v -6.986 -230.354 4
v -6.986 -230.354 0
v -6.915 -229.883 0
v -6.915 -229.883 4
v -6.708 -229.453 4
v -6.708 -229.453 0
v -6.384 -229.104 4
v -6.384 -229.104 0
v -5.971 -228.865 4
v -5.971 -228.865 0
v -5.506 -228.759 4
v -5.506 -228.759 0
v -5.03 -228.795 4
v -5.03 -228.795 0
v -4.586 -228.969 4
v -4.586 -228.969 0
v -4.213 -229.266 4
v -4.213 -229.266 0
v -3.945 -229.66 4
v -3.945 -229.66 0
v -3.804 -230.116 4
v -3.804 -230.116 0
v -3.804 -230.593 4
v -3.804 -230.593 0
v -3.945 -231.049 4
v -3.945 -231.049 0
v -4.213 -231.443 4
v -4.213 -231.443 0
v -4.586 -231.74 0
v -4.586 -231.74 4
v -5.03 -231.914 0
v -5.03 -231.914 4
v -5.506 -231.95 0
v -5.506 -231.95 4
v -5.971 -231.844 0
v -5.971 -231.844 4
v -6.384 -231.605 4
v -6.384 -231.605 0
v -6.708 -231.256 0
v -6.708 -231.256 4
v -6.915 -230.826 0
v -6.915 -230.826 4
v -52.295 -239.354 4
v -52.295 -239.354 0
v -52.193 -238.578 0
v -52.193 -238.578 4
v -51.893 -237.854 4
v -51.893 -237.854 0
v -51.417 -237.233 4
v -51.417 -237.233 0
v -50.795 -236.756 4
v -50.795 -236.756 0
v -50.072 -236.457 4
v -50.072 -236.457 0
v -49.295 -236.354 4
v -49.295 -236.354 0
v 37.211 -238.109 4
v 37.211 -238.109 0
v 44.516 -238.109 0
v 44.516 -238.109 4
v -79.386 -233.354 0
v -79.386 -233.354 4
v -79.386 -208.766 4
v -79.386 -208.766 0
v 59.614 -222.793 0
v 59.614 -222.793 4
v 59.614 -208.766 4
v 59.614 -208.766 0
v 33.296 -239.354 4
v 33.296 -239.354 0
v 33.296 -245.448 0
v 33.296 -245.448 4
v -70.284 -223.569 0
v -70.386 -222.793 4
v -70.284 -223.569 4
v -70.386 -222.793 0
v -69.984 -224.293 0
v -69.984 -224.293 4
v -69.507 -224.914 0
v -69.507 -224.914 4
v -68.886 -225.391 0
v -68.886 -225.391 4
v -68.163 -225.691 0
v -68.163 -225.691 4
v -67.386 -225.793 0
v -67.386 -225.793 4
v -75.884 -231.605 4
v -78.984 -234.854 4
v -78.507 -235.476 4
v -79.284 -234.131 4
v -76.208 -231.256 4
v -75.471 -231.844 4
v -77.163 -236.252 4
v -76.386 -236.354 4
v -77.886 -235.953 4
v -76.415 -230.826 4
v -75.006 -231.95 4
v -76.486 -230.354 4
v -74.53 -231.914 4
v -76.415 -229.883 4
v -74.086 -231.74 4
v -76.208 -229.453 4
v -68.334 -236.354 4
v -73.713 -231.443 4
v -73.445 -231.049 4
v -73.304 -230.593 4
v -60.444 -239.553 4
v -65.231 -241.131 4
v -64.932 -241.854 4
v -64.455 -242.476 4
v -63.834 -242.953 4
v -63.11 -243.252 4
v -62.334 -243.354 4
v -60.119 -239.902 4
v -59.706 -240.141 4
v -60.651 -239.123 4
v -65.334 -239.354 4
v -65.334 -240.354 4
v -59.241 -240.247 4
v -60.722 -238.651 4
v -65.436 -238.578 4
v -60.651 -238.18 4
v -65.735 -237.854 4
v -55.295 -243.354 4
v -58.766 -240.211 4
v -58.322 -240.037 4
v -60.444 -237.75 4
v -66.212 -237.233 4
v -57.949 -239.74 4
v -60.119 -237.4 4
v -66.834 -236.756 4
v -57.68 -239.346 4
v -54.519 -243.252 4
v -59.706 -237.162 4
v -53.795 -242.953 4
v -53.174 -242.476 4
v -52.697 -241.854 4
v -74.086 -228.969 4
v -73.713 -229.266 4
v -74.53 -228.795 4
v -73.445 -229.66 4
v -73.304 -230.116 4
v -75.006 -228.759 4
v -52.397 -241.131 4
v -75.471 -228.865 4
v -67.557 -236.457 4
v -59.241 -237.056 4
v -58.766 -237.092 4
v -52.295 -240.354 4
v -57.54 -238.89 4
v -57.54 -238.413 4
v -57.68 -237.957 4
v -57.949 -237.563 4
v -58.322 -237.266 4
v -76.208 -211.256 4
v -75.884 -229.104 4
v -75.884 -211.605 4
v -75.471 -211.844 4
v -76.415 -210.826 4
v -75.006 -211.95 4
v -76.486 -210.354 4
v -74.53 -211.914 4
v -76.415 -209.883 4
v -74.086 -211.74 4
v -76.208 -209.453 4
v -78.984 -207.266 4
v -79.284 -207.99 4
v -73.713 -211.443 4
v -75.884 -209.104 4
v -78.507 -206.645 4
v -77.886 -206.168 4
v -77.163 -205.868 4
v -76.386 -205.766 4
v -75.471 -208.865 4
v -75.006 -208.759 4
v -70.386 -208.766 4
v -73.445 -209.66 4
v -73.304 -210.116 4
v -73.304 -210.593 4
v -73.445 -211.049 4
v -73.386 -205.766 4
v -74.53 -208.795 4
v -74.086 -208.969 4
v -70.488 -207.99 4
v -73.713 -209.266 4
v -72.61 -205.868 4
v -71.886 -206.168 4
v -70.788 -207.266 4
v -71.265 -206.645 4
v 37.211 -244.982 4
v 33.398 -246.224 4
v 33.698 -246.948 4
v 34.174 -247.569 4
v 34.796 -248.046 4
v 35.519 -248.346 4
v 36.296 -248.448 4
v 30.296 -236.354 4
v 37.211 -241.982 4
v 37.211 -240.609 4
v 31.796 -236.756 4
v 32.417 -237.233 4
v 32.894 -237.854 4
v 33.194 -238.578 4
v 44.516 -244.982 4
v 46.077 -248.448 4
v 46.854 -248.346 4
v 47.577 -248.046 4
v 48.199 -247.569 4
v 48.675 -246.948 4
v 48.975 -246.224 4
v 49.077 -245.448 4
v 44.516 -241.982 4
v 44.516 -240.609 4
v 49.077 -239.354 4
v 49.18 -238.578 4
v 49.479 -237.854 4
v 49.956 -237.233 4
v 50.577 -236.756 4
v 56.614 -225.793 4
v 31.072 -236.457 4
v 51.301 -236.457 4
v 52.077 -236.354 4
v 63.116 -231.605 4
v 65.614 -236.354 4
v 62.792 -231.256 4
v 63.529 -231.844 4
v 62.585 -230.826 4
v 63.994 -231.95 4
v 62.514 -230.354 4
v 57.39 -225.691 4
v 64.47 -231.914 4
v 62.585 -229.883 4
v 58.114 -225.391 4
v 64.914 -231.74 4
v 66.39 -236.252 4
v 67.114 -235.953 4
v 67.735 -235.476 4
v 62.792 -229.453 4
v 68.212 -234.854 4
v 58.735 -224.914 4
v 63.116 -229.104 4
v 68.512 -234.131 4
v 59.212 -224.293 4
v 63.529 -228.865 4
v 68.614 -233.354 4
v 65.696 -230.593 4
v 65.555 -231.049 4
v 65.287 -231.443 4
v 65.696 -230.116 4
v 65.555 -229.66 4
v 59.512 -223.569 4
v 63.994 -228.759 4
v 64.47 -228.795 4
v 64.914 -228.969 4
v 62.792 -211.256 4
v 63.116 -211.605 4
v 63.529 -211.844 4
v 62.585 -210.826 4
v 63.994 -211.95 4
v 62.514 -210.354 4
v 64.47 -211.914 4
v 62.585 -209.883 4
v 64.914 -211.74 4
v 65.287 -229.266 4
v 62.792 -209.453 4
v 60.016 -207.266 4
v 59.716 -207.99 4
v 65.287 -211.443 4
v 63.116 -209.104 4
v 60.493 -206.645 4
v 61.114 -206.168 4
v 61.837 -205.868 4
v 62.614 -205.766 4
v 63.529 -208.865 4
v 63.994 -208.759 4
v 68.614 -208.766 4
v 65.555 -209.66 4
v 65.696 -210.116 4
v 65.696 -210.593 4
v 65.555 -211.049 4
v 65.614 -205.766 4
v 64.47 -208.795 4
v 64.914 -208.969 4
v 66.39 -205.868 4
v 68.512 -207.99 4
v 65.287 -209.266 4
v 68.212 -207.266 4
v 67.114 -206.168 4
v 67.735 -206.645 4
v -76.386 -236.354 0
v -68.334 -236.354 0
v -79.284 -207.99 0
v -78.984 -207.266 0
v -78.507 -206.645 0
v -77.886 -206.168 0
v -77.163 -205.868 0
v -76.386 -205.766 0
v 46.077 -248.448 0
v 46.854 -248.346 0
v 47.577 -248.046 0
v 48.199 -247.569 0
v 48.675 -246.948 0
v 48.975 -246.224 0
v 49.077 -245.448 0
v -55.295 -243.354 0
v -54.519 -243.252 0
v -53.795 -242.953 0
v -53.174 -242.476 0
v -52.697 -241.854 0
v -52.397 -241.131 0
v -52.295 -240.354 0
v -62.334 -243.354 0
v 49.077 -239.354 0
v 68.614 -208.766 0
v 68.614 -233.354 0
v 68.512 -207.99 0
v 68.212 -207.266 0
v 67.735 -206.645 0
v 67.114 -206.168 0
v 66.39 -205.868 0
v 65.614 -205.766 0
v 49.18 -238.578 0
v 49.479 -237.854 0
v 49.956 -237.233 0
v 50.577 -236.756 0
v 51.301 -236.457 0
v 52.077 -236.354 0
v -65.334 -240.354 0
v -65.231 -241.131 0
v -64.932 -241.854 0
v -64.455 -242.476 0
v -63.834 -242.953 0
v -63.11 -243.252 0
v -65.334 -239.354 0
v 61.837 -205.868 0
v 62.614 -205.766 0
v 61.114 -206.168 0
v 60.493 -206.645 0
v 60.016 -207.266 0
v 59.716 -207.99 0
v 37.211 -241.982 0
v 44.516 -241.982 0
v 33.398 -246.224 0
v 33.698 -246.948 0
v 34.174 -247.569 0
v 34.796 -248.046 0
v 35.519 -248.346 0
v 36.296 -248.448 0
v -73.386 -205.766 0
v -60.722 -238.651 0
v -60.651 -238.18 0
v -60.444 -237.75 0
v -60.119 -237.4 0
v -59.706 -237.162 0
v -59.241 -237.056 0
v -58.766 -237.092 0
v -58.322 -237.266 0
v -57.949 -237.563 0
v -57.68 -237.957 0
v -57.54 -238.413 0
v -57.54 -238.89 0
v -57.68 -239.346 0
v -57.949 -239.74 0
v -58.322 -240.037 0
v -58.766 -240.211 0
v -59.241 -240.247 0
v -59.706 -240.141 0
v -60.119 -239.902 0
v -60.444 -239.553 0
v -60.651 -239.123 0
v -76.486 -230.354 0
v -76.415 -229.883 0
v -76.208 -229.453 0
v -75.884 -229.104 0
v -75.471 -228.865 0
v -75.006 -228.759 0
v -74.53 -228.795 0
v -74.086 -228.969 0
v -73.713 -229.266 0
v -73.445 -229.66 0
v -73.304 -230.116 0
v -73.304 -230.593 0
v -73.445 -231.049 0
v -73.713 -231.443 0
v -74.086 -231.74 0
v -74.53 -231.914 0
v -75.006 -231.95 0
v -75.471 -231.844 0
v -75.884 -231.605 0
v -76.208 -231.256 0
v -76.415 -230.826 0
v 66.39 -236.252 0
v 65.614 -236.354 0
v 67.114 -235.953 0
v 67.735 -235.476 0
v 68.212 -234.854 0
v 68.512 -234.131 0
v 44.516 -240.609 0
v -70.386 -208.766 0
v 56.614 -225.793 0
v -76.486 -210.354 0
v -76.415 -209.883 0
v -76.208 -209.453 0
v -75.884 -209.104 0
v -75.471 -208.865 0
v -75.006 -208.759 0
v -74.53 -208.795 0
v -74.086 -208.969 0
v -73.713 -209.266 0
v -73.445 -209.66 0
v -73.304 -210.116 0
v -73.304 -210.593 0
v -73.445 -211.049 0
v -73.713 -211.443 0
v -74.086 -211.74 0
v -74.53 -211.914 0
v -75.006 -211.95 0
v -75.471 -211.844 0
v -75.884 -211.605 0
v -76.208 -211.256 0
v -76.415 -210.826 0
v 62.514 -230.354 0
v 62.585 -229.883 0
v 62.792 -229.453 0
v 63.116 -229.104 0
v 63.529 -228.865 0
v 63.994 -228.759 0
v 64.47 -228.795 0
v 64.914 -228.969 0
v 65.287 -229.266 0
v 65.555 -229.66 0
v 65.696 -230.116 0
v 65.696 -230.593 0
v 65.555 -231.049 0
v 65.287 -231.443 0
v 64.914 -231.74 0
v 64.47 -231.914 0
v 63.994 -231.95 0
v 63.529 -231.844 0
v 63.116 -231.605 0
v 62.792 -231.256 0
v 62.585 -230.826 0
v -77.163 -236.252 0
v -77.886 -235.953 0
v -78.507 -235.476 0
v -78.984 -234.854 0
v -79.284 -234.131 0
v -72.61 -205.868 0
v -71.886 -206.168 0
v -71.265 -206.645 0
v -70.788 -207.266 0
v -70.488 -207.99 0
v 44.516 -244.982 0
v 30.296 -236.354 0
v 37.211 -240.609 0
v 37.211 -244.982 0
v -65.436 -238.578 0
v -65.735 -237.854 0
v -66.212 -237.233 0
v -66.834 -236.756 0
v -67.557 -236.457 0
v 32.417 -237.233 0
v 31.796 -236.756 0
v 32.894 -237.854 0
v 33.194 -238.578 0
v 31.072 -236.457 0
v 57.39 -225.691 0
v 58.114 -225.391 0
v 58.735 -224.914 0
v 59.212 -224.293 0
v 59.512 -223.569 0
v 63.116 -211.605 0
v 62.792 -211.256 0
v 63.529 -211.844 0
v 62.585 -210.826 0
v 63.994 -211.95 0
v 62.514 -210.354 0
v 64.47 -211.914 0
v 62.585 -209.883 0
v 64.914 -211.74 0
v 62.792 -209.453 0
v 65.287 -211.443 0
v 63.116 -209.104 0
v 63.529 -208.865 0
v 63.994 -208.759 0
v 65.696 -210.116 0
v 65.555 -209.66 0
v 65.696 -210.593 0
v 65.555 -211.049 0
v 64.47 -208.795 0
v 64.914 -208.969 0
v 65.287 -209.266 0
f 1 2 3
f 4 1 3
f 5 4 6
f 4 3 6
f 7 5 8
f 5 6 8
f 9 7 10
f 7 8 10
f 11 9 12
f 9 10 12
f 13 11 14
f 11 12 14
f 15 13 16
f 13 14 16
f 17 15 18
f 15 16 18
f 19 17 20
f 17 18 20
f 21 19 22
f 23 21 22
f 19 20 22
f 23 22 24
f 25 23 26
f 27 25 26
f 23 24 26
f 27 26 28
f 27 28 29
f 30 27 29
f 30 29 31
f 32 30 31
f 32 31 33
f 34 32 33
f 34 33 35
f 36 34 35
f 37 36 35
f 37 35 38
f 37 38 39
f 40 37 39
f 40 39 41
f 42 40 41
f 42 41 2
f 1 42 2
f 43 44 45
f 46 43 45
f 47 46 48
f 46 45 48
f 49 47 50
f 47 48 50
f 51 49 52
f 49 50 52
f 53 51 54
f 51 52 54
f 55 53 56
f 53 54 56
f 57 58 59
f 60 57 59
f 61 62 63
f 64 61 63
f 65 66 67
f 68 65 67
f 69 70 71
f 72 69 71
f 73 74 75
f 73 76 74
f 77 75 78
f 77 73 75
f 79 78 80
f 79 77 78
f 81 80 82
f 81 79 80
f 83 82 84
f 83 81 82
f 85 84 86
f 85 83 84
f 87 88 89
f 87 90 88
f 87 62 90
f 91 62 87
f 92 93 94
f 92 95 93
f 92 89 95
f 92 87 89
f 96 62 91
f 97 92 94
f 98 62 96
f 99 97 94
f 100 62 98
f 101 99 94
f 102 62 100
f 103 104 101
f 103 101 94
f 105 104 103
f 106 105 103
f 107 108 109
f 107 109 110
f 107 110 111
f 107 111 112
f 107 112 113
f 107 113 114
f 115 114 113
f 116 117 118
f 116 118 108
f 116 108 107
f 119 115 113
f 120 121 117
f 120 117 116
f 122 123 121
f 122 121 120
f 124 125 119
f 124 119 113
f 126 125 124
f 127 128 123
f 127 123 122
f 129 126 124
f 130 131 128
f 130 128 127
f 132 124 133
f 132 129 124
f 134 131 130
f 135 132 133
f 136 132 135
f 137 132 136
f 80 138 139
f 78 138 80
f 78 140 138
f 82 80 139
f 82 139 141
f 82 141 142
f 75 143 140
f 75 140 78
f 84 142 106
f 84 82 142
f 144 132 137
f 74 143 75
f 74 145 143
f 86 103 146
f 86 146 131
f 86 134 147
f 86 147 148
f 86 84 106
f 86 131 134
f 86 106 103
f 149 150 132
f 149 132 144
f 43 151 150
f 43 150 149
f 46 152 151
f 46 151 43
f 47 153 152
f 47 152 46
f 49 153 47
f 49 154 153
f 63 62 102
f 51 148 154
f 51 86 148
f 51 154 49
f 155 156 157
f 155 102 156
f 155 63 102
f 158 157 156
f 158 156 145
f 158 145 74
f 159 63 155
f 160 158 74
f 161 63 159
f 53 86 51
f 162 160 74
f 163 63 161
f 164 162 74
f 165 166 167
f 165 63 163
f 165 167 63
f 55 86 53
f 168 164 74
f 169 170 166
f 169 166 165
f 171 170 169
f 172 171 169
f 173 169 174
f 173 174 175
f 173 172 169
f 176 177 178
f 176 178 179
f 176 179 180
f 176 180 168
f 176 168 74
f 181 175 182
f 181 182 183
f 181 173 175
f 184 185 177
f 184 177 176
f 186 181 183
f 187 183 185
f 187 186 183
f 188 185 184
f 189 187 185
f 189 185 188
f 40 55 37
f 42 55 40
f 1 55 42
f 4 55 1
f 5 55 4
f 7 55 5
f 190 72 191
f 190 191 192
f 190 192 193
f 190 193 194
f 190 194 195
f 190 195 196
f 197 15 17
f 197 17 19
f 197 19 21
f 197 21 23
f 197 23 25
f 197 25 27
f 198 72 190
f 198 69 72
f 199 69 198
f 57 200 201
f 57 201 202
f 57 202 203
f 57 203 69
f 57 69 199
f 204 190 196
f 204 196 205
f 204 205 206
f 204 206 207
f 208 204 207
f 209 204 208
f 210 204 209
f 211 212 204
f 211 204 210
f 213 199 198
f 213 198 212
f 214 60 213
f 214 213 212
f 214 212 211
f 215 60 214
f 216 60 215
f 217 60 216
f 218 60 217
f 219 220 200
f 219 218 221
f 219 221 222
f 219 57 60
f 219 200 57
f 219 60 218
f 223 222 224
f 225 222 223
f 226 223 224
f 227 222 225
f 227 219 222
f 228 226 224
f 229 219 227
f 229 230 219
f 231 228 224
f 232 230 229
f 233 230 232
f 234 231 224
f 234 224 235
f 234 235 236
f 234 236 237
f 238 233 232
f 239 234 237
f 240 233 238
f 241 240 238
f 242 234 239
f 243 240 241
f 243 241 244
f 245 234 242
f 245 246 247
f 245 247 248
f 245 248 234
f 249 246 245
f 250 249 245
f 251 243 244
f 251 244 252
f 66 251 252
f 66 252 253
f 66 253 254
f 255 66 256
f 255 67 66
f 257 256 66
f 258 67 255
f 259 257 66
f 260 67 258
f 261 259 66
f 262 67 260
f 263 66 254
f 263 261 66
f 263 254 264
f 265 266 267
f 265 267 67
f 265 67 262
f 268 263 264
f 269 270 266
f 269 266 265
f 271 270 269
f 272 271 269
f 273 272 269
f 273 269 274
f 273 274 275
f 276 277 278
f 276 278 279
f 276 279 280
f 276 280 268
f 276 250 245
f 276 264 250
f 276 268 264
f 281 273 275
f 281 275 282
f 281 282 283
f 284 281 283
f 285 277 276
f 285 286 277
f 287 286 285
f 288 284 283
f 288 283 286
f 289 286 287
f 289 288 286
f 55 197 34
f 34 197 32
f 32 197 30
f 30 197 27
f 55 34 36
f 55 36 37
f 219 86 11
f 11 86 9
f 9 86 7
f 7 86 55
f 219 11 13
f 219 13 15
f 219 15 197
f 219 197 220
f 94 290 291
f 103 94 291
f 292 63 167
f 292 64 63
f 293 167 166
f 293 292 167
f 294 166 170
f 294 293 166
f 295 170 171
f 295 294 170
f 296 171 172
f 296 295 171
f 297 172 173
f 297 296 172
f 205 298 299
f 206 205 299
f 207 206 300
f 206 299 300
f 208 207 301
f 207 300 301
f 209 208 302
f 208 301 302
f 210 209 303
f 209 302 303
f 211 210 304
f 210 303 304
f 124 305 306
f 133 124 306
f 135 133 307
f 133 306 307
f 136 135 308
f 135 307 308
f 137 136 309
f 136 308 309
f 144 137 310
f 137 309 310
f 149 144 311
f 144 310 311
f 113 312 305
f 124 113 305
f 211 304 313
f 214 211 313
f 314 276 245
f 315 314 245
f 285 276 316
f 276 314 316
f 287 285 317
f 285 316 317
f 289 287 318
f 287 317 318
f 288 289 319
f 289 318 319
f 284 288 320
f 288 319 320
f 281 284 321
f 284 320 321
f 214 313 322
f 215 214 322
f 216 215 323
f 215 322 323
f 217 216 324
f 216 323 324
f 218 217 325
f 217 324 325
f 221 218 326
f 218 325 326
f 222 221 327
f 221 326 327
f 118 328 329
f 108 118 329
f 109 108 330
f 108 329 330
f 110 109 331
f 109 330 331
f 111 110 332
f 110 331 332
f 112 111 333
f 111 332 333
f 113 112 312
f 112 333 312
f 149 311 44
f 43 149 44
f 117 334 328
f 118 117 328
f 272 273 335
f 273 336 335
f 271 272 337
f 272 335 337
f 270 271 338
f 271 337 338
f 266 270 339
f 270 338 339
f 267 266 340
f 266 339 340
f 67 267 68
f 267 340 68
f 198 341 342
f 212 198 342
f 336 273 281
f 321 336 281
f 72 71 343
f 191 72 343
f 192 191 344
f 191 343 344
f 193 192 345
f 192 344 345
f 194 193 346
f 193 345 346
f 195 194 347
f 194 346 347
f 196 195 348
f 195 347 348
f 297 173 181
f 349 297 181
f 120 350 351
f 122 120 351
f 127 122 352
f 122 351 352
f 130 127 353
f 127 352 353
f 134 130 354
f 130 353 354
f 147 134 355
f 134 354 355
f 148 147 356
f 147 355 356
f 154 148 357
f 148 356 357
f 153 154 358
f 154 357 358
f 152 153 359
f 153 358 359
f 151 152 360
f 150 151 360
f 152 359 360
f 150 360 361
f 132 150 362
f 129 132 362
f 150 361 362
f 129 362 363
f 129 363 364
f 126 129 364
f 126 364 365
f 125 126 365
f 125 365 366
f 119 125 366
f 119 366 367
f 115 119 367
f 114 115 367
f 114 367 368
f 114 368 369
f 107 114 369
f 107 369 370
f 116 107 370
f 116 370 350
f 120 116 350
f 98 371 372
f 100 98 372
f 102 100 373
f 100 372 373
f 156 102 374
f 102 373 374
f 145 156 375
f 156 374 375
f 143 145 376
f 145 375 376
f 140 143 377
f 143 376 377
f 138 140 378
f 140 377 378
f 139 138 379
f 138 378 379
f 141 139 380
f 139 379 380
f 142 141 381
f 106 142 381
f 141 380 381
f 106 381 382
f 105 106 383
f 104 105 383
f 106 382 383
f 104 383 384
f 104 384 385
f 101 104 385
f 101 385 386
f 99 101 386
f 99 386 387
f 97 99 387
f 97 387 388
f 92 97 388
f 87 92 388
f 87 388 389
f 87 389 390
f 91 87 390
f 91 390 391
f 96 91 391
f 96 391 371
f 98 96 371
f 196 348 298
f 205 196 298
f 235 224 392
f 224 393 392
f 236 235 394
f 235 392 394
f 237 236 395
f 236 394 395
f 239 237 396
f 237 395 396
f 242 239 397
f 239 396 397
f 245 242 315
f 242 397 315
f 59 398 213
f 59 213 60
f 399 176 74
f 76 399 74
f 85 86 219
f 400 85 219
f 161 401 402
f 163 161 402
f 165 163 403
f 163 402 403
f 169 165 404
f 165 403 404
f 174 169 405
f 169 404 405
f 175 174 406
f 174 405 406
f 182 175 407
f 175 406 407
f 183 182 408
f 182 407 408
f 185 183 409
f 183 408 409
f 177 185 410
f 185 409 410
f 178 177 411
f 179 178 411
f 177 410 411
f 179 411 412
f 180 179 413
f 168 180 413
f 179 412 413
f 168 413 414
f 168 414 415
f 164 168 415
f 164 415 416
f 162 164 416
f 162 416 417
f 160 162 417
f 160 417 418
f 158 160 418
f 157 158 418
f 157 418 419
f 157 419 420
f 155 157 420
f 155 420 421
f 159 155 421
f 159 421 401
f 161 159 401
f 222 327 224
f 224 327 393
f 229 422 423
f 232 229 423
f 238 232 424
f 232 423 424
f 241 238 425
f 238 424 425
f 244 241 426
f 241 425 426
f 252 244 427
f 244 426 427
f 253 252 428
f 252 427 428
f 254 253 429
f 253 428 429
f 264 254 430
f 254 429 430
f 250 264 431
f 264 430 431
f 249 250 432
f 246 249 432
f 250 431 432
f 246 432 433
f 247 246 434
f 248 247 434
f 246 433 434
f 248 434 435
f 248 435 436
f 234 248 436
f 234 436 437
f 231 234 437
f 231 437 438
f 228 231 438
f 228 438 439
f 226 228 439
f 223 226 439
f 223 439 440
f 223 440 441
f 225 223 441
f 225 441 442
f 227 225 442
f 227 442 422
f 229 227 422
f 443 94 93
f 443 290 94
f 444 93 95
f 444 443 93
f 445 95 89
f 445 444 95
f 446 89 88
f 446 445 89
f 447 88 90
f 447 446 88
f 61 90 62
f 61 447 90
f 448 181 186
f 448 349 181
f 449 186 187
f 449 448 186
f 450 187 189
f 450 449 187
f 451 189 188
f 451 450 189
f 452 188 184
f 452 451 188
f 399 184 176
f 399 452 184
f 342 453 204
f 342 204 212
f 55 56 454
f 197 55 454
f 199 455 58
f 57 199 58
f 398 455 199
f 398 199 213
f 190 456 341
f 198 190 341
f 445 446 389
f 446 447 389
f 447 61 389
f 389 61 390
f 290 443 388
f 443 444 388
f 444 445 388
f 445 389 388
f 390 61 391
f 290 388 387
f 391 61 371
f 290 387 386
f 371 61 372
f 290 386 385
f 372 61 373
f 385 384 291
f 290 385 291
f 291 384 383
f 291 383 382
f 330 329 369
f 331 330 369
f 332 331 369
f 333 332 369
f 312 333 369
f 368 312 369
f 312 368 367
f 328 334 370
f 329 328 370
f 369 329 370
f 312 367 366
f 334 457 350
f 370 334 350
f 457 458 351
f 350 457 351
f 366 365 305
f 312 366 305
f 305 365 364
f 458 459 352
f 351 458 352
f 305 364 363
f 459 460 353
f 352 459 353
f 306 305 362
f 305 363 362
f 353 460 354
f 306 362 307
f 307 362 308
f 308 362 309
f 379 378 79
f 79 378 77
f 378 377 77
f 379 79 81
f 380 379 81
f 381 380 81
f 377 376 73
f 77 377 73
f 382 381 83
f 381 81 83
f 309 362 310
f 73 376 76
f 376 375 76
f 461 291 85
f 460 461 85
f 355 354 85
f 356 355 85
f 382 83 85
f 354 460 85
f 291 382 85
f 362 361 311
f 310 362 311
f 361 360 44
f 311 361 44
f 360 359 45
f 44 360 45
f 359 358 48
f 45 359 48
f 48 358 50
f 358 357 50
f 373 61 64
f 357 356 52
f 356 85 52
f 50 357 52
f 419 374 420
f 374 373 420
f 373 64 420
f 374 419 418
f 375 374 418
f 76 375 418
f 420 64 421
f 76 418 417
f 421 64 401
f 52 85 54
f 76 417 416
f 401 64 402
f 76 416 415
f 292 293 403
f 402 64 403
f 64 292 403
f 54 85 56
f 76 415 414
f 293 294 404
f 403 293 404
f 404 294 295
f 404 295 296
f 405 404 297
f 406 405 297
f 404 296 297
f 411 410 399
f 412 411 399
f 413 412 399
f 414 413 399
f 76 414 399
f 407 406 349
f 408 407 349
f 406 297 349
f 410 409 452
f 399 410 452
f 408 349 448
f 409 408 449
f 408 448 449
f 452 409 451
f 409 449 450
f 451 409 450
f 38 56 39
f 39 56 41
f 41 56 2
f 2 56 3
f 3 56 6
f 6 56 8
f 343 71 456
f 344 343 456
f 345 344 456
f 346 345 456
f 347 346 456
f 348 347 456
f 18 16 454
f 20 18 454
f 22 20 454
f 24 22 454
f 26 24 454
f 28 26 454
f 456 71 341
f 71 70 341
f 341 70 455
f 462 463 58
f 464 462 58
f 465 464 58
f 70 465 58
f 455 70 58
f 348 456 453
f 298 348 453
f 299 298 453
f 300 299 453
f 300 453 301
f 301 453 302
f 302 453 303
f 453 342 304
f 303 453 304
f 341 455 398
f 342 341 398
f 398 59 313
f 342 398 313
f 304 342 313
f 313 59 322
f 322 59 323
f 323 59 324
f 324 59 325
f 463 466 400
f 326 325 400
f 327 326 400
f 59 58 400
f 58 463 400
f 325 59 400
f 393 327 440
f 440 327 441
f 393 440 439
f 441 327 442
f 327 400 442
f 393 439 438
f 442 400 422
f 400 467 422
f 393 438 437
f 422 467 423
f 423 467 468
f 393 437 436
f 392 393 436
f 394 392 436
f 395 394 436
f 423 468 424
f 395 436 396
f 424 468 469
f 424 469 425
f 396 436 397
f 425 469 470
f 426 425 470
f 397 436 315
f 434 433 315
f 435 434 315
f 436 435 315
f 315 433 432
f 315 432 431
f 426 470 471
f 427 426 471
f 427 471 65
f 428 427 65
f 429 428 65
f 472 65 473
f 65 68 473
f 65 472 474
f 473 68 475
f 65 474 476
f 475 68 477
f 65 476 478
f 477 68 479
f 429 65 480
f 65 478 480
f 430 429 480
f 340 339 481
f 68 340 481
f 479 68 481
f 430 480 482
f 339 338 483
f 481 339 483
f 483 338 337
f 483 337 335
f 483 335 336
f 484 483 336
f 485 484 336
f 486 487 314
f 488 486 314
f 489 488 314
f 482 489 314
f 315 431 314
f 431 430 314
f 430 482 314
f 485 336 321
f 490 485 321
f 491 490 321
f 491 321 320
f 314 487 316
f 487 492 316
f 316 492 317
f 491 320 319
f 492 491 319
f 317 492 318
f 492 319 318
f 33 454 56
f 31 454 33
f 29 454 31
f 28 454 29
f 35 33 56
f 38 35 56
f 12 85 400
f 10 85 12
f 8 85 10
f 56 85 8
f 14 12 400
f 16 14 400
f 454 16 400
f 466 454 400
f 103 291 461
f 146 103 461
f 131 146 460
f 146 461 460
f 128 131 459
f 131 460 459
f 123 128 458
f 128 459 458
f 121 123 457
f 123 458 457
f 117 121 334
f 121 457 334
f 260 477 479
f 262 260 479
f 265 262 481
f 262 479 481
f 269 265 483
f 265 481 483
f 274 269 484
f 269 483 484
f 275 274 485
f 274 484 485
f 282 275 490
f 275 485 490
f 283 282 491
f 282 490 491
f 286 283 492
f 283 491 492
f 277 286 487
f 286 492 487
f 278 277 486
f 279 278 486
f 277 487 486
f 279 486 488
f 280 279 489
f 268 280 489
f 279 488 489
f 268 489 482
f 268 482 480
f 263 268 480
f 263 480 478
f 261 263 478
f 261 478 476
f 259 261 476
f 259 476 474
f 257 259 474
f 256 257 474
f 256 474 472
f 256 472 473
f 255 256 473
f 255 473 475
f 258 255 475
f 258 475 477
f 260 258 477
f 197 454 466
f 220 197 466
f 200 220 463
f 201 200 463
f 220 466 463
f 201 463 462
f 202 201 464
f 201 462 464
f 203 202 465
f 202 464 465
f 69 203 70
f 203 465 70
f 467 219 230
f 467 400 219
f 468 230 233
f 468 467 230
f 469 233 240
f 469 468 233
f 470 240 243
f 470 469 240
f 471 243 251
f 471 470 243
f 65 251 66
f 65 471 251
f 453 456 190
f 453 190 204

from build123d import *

# Parameters (mm, degrees)
ESBO_O1_W                = 7.305190172
ESBO_O1_H                = 2.5
ESBO_O1_H_2              = 3
RESSALTO_EXTRUS_O1_DEPTH = 4
CUT_EXTRUDE1_DEPTH       = 10
FURO_COM_FOLGA_DE_M31_D  = 3.2
FILLET1_R                = 3


with BuildPart() as part:
    # Esboço1 → Ressalto-extrusão1 (new body)
    with BuildSketch(Plane.XY):
        with BuildLine():
            Line((-49.295269139, -236.354481491), (30.295730877, -236.354481491))
            ThreePointArc((30.295730877, -236.354481491), (32.417051221, -237.233161147), (33.295730877, -239.354481491))
            Line((33.295730877, -239.354481491), (33.295730877, -245.447951064))
            ThreePointArc((33.295730877, -245.447951064), (34.174410534, -247.569271408), (36.295730877, -248.447951064))
            Line((36.295730877, -248.447951064), (46.077297056, -248.447951064))
            ThreePointArc((46.077297056, -248.447951064), (48.198617399, -247.569271408), (49.077297056, -245.447951064))
            Line((49.077297056, -245.447951064), (49.077297056, -239.354481491))
            ThreePointArc((49.077297056, -239.354481491), (49.955976712, -237.233161147), (52.077297056, -236.354481491))
            Line((52.077297056, -236.354481491), (68.643919436, -236.354481491))
            ThreePointArc((68.643919436, -236.354481491), (70.765239779, -235.475801834), (71.643919436, -233.354481491))
            Line((71.643919436, -233.354481491), (71.643919436, -231.207792375))
            Line((71.643919436, -231.207792375), (84.613919436, -231.207792375))
            Line((84.613919436, -231.207792375), (84.613919436, -65.265257908))
            Line((84.613919436, -65.265257908), (71.643919436, -65.265257908))
            Line((71.643919436, -65.265257908), (71.643919436, -47.354481491))
            ThreePointArc((71.643919436, -47.354481491), (70.765239779, -45.233161147), (68.643919436, -44.354481491))
            Line((68.643919436, -44.354481491), (-79.423286283, -44.354481491))
            ThreePointArc((-79.423286283, -44.354481491), (-81.544606627, -45.233161147), (-82.423286283, -47.354481491))
            Line((-82.423286283, -47.354481491), (-82.423286283, -65.265257908))
            Line((-82.423286283, -65.265257908), (-99.449266915, -65.265257908))
            Line((-99.449266915, -65.265257908), (-99.449266915, -233.354481491))
            ThreePointArc((-99.449266915, -233.354481491), (-98.570587259, -235.475801834), (-96.449266915, -236.354481491))
            Line((-96.449266915, -236.354481491), (-68.333570548, -236.354481491))
            ThreePointArc((-68.333570548, -236.354481491), (-66.212250205, -237.233161147), (-65.333570548, -239.354481491))
            Line((-65.333570548, -239.354481491), (-65.333570548, -240.354481491))
            ThreePointArc((-65.333570548, -240.354481491), (-64.454890892, -242.475801834), (-62.333570548, -243.354481491))
            Line((-62.333570548, -243.354481491), (-55.295269139, -243.354481491))
            ThreePointArc((-55.295269139, -243.354481491), (-53.173948795, -242.475801834), (-52.295269139, -240.354481491))
            Line((-52.295269139, -240.354481491), (-52.295269139, -239.354481491))
            ThreePointArc((-52.295269139, -239.354481491), (-51.416589482, -237.233161147), (-49.295269139, -236.354481491))
        make_face()
        with Locations((40.863663265, -239.358820259)):
            Rectangle(ESBO_O1_W, ESBO_O1_H, mode=Mode.SUBTRACT)
        with Locations((40.863663265, -243.481650875)):
            Rectangle(ESBO_O1_W, ESBO_O1_H_2, mode=Mode.SUBTRACT)
        with Locations((40.863663265, -51.350142723)):
            Rectangle(ESBO_O1_W, ESBO_O1_H, mode=Mode.SUBTRACT)
        with Locations((40.863663265, -47.227312107)):
            Rectangle(ESBO_O1_W, ESBO_O1_H_2, mode=Mode.SUBTRACT)
    extrude(amount=RESSALTO_EXTRUS_O1_DEPTH)

    # Sketch1 → Cut-Extrude1 (cut)
    with BuildSketch(Plane.XY.offset(4)):
        with BuildLine():
            Line((-79.386080564, -236.354481491), (-79.386080564, -228.792861815))
            Line((-79.386080564, -228.792861815), (-79.386080564, -205.765971774))
            Line((-79.386080564, -205.765971774), (-70.386080564, -205.765971774))
            Line((-70.386080564, -205.765971774), (-70.386080564, -225.792861815))
            Line((-70.386080564, -225.792861815), (59.613919436, -225.792861815))
            Line((59.613919436, -225.792861815), (59.613919436, -205.765971774))
            Line((59.613919436, -205.765971774), (68.613919436, -205.765971774))
            Line((68.613919436, -205.765971774), (68.613919436, -228.792861815))
            Line((68.613919436, -228.792861815), (68.613919436, -236.354481491))
            Line((68.613919436, -236.354481491), (68.643919436, -236.354481491))
            ThreePointArc((68.643919436, -236.354481491), (70.765239779, -235.475801834), (71.643919436, -233.354481491))
            Line((71.643919436, -233.354481491), (71.643919436, -231.207792375))
            Line((71.643919436, -231.207792375), (84.613919436, -231.207792375))
            Line((84.613919436, -231.207792375), (84.613919436, -65.265257908))
            Line((84.613919436, -65.265257908), (71.643919436, -65.265257908))
            Line((71.643919436, -65.265257908), (71.643919436, -47.354481491))
            ThreePointArc((71.643919436, -47.354481491), (70.765239779, -45.233161147), (68.643919436, -44.354481491))
            Line((68.643919436, -44.354481491), (-79.423286283, -44.354481491))
            ThreePointArc((-79.423286283, -44.354481491), (-81.544606627, -45.233161147), (-82.423286283, -47.354481491))
            Line((-82.423286283, -47.354481491), (-82.423286283, -65.265257908))
            Line((-82.423286283, -65.265257908), (-99.449266915, -65.265257908))
            Line((-99.449266915, -65.265257908), (-99.449266915, -233.354481491))
            ThreePointArc((-99.449266915, -233.354481491), (-98.570587259, -235.475801834), (-96.449266915, -236.354481491))
            Line((-96.449266915, -236.354481491), (-79.386080564, -236.354481491))
        make_face()
    extrude(amount=-CUT_EXTRUDE1_DEPTH, mode=Mode.SUBTRACT)

    # Furo com folga de M31 (through all)
    with Locations(Plane.XY.offset(4)):
        with Locations((-74.886080564, -50.354481491), (64.113919436, -230.354481491), (64.113919436, -50.354481491), (-74.886080564, -230.354481491), (-59.12185492, -47.477548601), (-5.386080564, -50.354481491), (-59.12185492, -238.651414381), (-5.386080564, -230.354481491), (64.113919436, -210.354481491), (-74.886080564, -210.354481491)):
            Hole(FURO_COM_FOLGA_DE_M31_D / 2)

    # Fillet1
    fillet1_edges = [part.edges().sort_by_distance(p)[0] for p in [
        (-79.386080564, -236.354481491, 2),
        (68.613919436, -205.765971774, 2),
        (59.613919436, -205.765971774, 2),
        (59.613919436, -225.792861815, 2),
        (-70.386080564, -225.792861815, 2),
        (-70.386080564, -205.765971774, 2),
        (-79.386080564, -205.765971774, 2),
        (68.613919436, -236.354481491, 2),
    ]]
    fillet(fillet1_edges, radius=FILLET1_R)


solid = part.part
